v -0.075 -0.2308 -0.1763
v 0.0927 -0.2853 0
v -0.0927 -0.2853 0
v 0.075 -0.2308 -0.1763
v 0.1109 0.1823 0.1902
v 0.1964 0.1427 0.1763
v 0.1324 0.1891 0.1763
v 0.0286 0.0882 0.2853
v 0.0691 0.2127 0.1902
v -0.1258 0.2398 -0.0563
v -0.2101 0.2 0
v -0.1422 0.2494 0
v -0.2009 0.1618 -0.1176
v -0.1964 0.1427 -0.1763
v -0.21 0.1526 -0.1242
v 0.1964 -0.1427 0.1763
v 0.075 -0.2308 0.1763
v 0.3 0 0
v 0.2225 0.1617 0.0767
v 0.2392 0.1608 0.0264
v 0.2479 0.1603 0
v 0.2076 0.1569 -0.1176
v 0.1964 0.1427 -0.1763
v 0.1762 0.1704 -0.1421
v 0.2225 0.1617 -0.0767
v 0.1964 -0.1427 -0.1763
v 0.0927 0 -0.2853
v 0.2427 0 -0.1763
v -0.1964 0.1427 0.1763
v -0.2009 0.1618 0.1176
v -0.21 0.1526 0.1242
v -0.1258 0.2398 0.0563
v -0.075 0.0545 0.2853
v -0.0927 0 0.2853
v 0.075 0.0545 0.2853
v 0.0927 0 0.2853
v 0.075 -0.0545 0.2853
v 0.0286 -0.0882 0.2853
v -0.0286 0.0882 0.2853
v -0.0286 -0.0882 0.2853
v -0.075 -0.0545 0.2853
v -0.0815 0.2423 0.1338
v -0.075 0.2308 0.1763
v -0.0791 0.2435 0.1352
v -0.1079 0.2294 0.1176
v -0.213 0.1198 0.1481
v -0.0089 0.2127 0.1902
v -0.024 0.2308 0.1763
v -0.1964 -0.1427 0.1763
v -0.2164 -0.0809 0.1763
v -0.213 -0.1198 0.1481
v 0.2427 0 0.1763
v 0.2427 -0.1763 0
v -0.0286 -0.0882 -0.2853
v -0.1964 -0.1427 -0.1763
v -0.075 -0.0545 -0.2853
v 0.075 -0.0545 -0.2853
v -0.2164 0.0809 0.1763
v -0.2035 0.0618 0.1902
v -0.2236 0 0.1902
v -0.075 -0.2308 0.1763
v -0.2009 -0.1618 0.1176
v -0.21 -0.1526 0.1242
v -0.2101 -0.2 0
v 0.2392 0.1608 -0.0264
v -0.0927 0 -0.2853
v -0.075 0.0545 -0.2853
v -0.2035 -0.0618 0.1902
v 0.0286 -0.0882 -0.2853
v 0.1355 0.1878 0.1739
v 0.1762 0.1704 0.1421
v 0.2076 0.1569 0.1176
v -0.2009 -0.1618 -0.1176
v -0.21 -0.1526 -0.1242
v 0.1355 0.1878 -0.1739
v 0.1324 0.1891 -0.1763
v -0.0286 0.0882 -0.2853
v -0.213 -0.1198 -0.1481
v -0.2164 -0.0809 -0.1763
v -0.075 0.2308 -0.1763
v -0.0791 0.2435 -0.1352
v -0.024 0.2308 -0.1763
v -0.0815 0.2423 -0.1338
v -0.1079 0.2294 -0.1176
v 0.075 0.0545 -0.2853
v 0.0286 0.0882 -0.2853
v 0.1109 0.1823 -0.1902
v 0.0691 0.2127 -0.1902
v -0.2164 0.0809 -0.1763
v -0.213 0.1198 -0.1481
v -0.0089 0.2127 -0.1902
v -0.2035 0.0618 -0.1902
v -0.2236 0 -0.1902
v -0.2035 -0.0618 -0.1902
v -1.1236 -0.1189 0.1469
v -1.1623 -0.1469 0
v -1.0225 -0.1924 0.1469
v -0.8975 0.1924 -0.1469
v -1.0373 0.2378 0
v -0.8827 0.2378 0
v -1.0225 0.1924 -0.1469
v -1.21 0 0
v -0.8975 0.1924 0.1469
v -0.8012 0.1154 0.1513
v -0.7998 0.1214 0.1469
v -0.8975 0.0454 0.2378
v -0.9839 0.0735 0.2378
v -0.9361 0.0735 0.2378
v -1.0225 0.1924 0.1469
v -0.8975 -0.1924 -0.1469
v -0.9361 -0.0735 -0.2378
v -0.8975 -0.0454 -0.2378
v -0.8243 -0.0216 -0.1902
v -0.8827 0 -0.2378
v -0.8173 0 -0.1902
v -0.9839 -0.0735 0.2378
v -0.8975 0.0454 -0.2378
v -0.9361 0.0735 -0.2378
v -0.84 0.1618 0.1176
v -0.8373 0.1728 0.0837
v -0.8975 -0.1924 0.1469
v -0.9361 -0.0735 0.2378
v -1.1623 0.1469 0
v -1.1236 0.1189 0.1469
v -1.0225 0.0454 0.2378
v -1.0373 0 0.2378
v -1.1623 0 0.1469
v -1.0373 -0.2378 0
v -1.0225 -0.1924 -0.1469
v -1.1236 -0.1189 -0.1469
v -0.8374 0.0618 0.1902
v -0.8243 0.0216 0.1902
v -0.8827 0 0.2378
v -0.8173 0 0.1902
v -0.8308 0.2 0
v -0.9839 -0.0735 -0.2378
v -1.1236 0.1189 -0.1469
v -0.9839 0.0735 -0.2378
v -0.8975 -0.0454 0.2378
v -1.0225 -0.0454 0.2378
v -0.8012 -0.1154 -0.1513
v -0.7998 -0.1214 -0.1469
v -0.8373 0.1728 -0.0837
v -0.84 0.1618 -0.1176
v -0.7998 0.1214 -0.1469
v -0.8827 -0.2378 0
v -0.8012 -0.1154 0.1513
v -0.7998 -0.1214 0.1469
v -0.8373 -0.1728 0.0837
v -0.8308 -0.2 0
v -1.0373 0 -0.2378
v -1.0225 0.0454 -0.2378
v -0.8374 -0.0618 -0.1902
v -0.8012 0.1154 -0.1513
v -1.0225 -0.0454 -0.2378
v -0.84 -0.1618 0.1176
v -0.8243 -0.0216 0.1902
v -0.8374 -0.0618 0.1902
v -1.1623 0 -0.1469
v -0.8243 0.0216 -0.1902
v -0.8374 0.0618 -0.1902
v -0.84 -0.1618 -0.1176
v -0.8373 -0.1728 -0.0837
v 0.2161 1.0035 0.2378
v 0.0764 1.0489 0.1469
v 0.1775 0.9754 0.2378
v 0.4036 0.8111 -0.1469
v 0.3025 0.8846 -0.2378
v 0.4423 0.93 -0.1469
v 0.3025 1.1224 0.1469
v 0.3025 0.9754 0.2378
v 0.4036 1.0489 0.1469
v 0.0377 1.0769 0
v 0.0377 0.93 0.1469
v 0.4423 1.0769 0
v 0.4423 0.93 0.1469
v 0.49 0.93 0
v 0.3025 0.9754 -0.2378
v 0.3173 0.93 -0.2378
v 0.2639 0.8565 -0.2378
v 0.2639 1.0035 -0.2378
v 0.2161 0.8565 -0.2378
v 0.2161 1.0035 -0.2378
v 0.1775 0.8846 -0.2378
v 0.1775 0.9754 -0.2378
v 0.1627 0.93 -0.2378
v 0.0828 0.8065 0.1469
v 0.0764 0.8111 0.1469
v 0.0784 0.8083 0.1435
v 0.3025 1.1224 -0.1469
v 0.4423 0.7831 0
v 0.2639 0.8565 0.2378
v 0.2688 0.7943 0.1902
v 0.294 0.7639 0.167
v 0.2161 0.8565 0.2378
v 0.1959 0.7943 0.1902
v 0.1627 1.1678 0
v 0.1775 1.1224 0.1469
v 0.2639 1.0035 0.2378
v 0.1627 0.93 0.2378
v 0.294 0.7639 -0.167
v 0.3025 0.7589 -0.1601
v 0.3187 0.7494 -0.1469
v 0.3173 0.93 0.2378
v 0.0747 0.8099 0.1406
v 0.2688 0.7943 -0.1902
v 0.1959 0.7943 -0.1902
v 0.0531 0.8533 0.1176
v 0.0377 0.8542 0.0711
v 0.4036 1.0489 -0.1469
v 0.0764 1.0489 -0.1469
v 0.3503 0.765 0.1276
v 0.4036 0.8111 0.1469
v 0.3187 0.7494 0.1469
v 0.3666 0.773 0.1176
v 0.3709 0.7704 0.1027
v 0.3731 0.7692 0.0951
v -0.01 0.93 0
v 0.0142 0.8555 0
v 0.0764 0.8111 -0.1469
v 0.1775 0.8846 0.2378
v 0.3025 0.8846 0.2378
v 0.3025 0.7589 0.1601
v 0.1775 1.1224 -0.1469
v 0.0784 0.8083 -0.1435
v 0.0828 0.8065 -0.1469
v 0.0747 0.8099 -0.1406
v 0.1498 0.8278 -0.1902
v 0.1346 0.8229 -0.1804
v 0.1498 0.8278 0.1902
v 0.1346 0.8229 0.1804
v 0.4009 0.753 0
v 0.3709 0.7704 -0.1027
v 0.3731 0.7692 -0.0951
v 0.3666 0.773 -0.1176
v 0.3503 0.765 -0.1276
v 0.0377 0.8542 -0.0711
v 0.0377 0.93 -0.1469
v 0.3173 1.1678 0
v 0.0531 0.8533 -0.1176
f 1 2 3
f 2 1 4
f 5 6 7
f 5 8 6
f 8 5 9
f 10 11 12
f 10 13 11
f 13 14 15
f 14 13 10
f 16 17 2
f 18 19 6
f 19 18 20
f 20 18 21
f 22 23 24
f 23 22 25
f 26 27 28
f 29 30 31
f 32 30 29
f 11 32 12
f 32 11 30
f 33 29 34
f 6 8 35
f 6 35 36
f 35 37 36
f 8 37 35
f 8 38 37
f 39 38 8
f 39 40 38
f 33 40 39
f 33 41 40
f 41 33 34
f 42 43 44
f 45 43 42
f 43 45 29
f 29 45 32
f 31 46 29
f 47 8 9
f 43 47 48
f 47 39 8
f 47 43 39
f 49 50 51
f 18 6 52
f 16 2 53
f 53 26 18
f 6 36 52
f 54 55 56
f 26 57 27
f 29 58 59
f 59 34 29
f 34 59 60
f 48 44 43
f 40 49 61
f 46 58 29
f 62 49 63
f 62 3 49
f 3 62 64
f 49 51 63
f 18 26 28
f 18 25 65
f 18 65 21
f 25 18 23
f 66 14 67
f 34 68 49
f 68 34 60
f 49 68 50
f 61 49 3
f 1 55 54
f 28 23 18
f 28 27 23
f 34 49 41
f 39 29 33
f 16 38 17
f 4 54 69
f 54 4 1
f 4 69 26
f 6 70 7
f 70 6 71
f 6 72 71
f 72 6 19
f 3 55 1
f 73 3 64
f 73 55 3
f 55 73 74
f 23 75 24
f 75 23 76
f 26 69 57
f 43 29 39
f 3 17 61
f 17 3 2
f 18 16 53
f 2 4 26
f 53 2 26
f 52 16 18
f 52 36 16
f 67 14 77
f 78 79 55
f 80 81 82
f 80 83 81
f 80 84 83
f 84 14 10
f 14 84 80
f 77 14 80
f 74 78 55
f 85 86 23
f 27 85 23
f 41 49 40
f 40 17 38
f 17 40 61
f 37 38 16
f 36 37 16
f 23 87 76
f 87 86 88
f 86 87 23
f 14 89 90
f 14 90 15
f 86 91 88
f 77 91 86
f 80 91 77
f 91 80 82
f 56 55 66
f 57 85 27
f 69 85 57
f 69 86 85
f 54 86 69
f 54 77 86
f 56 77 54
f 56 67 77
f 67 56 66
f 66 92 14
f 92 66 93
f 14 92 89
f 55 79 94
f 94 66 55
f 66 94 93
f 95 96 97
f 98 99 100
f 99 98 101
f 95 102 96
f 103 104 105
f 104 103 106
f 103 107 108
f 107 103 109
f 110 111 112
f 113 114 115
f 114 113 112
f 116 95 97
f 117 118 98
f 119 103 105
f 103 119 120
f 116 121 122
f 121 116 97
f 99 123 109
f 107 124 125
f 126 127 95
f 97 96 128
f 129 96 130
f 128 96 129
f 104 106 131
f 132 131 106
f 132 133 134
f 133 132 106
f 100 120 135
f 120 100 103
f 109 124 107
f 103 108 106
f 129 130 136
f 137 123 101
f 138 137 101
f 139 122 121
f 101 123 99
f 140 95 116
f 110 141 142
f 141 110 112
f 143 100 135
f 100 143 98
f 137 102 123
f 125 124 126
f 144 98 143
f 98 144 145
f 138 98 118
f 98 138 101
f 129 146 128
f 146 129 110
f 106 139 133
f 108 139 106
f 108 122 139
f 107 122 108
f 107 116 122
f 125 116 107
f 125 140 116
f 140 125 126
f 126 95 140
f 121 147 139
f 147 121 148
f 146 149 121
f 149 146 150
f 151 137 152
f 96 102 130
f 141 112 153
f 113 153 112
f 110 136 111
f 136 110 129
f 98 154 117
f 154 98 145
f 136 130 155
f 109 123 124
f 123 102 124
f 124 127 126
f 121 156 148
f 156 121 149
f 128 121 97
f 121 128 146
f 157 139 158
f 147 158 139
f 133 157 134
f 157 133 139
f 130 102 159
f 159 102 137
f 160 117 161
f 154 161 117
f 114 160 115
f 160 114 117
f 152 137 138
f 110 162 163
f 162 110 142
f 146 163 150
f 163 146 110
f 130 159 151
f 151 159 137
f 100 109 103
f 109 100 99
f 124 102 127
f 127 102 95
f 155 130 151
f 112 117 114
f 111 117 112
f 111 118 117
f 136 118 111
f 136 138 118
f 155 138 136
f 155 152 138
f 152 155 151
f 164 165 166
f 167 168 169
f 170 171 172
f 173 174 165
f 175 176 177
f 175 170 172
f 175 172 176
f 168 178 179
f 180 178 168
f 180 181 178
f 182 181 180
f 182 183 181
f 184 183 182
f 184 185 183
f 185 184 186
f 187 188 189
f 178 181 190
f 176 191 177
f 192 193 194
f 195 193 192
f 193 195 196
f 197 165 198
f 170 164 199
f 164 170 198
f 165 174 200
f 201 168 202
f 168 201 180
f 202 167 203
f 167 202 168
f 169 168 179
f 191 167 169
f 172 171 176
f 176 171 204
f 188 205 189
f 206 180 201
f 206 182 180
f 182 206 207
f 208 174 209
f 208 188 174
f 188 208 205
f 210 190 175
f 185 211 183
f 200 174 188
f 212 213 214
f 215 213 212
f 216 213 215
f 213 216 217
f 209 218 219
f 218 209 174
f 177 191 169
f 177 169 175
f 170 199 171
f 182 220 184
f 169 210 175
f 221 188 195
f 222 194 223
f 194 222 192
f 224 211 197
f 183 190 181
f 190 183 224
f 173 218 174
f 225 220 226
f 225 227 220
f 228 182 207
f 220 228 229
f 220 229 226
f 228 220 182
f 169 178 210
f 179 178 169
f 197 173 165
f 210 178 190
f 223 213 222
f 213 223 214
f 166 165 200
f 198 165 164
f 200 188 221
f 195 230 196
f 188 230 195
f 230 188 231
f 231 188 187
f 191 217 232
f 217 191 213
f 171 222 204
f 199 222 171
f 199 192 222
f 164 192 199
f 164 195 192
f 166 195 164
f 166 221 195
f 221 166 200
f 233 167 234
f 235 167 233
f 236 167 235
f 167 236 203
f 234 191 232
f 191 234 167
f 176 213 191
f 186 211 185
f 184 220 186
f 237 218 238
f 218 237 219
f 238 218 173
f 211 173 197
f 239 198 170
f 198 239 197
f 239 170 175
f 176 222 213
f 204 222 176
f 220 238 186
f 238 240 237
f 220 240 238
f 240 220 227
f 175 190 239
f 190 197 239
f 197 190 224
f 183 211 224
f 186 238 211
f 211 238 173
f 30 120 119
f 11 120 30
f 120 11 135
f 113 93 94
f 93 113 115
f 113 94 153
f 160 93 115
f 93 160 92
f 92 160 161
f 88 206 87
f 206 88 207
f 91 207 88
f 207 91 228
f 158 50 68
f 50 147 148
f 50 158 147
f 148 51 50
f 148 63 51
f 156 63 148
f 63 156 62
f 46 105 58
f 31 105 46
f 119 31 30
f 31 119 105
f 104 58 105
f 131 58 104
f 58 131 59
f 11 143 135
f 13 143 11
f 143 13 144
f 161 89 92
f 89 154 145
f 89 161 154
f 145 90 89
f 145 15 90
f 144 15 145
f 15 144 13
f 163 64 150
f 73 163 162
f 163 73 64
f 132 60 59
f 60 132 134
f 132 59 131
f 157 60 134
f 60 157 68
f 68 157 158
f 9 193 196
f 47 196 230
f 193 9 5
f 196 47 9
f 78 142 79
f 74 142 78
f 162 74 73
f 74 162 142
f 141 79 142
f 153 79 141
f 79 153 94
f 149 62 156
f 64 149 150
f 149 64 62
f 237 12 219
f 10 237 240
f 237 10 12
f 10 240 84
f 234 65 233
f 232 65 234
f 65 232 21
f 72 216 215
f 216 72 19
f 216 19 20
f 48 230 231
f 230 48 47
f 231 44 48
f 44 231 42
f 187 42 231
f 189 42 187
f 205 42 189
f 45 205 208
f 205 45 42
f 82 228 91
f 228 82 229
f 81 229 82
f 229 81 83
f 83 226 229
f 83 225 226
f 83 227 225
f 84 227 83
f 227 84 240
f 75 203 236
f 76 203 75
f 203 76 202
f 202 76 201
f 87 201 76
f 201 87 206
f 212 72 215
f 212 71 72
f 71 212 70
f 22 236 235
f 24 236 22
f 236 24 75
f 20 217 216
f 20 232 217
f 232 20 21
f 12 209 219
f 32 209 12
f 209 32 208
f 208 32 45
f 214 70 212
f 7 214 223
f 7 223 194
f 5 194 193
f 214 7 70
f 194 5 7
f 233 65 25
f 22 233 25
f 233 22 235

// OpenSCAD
/*

Creates a model of a molcule from a set
of orthogonal coordinates

*/

module atom(rx,x0,y0,z0)
{
  translate(v=[x0,y0,z0])
  sphere(r=rx,$fn=10);
}

/* spheres of radius rx are placed at the atomic
 positions - x0,y0,z0
*/



module bond(x2,y2,z2,x1,y1,z1)

{
tx = (x2 + x1)/2;
ty = (y2 + y1)/2;
tz = (z2 + z1)/2;
ax = x2 - x1 ;
ay = y2 - y1;
az = z2 - z1;

translate(v=[tx,ty,tz])
rotate(a = [-acos(az/sqrt(ax*ax+ay*ay+az*az)), 0, -atan2(ax, ay)])
cylinder(r=.2,h=sqrt(ax*ax+ay*ay+az*az),center=true,$fn=10);

// cylinder radius, here r=.2, can be altered in the cylinder command

}

/*

Module bond represents a bond between two atoms -
as a cylinder - the orthogonal coordinates of the two
atoms are passed



 x1,y1,z1 coordinates of the first atom
 x2,y2,z2 coordinates of the second atom


tx,ty,and tz are the coordinates of the midpoint of the line
             connecting the atoms
ax,ay,and az is the vector between the atoms

              A cylinder whose height is equal to the bond length
              is placed at the origin and rotated to align with the
              bond.  The cylinder is then translated to the proper
              position

             David Moews supplied the rotate command.

                                                            P Moews


*/



union()
{

 // input to make a water molecule

atom (.3, 0 , 0 ,0) ;                     // oxygen radius = 0.3 Angstroms
atom  (.25 ,-.96 , 0 ,0);                   // H1   radius = 0.25 Angstoms
atom  (.25 , .24, .93, 0);                  // H2

bond (0,0,0, -.96, 0, 0);                  // O - H bond
bond (0, 0, 0, .24, .93, 0);               // second O - H bond

}
/*

Orthogonal coordinates of water (Angstroms)

  The hydrogen oxygen bond distance is about 0.96 Angstroms
  The hydrogen oxygen hydrogen angle is 104.5 degrees

  oxygen (at origin)  x = 0 , y = 0 , z = 0
  hydrogen 1 about 0.96 Angstroms from oxygen - put it
  along the negative x axis  i.e. x = -0.96 , y = 0 , z = 0
  hydrogen 2 in first quadrant - makes 104.5 degree angle with hydrogen 1
  x = .96 * cos(180 - 104.5) = 0.24 , y = .96 * sin (75.5) = .93 , z = 0

  so coordinates are:

        x     y    z
  O     0     0    0
  H1 -.96     0    0
  H2  .24   .93    0
*/
